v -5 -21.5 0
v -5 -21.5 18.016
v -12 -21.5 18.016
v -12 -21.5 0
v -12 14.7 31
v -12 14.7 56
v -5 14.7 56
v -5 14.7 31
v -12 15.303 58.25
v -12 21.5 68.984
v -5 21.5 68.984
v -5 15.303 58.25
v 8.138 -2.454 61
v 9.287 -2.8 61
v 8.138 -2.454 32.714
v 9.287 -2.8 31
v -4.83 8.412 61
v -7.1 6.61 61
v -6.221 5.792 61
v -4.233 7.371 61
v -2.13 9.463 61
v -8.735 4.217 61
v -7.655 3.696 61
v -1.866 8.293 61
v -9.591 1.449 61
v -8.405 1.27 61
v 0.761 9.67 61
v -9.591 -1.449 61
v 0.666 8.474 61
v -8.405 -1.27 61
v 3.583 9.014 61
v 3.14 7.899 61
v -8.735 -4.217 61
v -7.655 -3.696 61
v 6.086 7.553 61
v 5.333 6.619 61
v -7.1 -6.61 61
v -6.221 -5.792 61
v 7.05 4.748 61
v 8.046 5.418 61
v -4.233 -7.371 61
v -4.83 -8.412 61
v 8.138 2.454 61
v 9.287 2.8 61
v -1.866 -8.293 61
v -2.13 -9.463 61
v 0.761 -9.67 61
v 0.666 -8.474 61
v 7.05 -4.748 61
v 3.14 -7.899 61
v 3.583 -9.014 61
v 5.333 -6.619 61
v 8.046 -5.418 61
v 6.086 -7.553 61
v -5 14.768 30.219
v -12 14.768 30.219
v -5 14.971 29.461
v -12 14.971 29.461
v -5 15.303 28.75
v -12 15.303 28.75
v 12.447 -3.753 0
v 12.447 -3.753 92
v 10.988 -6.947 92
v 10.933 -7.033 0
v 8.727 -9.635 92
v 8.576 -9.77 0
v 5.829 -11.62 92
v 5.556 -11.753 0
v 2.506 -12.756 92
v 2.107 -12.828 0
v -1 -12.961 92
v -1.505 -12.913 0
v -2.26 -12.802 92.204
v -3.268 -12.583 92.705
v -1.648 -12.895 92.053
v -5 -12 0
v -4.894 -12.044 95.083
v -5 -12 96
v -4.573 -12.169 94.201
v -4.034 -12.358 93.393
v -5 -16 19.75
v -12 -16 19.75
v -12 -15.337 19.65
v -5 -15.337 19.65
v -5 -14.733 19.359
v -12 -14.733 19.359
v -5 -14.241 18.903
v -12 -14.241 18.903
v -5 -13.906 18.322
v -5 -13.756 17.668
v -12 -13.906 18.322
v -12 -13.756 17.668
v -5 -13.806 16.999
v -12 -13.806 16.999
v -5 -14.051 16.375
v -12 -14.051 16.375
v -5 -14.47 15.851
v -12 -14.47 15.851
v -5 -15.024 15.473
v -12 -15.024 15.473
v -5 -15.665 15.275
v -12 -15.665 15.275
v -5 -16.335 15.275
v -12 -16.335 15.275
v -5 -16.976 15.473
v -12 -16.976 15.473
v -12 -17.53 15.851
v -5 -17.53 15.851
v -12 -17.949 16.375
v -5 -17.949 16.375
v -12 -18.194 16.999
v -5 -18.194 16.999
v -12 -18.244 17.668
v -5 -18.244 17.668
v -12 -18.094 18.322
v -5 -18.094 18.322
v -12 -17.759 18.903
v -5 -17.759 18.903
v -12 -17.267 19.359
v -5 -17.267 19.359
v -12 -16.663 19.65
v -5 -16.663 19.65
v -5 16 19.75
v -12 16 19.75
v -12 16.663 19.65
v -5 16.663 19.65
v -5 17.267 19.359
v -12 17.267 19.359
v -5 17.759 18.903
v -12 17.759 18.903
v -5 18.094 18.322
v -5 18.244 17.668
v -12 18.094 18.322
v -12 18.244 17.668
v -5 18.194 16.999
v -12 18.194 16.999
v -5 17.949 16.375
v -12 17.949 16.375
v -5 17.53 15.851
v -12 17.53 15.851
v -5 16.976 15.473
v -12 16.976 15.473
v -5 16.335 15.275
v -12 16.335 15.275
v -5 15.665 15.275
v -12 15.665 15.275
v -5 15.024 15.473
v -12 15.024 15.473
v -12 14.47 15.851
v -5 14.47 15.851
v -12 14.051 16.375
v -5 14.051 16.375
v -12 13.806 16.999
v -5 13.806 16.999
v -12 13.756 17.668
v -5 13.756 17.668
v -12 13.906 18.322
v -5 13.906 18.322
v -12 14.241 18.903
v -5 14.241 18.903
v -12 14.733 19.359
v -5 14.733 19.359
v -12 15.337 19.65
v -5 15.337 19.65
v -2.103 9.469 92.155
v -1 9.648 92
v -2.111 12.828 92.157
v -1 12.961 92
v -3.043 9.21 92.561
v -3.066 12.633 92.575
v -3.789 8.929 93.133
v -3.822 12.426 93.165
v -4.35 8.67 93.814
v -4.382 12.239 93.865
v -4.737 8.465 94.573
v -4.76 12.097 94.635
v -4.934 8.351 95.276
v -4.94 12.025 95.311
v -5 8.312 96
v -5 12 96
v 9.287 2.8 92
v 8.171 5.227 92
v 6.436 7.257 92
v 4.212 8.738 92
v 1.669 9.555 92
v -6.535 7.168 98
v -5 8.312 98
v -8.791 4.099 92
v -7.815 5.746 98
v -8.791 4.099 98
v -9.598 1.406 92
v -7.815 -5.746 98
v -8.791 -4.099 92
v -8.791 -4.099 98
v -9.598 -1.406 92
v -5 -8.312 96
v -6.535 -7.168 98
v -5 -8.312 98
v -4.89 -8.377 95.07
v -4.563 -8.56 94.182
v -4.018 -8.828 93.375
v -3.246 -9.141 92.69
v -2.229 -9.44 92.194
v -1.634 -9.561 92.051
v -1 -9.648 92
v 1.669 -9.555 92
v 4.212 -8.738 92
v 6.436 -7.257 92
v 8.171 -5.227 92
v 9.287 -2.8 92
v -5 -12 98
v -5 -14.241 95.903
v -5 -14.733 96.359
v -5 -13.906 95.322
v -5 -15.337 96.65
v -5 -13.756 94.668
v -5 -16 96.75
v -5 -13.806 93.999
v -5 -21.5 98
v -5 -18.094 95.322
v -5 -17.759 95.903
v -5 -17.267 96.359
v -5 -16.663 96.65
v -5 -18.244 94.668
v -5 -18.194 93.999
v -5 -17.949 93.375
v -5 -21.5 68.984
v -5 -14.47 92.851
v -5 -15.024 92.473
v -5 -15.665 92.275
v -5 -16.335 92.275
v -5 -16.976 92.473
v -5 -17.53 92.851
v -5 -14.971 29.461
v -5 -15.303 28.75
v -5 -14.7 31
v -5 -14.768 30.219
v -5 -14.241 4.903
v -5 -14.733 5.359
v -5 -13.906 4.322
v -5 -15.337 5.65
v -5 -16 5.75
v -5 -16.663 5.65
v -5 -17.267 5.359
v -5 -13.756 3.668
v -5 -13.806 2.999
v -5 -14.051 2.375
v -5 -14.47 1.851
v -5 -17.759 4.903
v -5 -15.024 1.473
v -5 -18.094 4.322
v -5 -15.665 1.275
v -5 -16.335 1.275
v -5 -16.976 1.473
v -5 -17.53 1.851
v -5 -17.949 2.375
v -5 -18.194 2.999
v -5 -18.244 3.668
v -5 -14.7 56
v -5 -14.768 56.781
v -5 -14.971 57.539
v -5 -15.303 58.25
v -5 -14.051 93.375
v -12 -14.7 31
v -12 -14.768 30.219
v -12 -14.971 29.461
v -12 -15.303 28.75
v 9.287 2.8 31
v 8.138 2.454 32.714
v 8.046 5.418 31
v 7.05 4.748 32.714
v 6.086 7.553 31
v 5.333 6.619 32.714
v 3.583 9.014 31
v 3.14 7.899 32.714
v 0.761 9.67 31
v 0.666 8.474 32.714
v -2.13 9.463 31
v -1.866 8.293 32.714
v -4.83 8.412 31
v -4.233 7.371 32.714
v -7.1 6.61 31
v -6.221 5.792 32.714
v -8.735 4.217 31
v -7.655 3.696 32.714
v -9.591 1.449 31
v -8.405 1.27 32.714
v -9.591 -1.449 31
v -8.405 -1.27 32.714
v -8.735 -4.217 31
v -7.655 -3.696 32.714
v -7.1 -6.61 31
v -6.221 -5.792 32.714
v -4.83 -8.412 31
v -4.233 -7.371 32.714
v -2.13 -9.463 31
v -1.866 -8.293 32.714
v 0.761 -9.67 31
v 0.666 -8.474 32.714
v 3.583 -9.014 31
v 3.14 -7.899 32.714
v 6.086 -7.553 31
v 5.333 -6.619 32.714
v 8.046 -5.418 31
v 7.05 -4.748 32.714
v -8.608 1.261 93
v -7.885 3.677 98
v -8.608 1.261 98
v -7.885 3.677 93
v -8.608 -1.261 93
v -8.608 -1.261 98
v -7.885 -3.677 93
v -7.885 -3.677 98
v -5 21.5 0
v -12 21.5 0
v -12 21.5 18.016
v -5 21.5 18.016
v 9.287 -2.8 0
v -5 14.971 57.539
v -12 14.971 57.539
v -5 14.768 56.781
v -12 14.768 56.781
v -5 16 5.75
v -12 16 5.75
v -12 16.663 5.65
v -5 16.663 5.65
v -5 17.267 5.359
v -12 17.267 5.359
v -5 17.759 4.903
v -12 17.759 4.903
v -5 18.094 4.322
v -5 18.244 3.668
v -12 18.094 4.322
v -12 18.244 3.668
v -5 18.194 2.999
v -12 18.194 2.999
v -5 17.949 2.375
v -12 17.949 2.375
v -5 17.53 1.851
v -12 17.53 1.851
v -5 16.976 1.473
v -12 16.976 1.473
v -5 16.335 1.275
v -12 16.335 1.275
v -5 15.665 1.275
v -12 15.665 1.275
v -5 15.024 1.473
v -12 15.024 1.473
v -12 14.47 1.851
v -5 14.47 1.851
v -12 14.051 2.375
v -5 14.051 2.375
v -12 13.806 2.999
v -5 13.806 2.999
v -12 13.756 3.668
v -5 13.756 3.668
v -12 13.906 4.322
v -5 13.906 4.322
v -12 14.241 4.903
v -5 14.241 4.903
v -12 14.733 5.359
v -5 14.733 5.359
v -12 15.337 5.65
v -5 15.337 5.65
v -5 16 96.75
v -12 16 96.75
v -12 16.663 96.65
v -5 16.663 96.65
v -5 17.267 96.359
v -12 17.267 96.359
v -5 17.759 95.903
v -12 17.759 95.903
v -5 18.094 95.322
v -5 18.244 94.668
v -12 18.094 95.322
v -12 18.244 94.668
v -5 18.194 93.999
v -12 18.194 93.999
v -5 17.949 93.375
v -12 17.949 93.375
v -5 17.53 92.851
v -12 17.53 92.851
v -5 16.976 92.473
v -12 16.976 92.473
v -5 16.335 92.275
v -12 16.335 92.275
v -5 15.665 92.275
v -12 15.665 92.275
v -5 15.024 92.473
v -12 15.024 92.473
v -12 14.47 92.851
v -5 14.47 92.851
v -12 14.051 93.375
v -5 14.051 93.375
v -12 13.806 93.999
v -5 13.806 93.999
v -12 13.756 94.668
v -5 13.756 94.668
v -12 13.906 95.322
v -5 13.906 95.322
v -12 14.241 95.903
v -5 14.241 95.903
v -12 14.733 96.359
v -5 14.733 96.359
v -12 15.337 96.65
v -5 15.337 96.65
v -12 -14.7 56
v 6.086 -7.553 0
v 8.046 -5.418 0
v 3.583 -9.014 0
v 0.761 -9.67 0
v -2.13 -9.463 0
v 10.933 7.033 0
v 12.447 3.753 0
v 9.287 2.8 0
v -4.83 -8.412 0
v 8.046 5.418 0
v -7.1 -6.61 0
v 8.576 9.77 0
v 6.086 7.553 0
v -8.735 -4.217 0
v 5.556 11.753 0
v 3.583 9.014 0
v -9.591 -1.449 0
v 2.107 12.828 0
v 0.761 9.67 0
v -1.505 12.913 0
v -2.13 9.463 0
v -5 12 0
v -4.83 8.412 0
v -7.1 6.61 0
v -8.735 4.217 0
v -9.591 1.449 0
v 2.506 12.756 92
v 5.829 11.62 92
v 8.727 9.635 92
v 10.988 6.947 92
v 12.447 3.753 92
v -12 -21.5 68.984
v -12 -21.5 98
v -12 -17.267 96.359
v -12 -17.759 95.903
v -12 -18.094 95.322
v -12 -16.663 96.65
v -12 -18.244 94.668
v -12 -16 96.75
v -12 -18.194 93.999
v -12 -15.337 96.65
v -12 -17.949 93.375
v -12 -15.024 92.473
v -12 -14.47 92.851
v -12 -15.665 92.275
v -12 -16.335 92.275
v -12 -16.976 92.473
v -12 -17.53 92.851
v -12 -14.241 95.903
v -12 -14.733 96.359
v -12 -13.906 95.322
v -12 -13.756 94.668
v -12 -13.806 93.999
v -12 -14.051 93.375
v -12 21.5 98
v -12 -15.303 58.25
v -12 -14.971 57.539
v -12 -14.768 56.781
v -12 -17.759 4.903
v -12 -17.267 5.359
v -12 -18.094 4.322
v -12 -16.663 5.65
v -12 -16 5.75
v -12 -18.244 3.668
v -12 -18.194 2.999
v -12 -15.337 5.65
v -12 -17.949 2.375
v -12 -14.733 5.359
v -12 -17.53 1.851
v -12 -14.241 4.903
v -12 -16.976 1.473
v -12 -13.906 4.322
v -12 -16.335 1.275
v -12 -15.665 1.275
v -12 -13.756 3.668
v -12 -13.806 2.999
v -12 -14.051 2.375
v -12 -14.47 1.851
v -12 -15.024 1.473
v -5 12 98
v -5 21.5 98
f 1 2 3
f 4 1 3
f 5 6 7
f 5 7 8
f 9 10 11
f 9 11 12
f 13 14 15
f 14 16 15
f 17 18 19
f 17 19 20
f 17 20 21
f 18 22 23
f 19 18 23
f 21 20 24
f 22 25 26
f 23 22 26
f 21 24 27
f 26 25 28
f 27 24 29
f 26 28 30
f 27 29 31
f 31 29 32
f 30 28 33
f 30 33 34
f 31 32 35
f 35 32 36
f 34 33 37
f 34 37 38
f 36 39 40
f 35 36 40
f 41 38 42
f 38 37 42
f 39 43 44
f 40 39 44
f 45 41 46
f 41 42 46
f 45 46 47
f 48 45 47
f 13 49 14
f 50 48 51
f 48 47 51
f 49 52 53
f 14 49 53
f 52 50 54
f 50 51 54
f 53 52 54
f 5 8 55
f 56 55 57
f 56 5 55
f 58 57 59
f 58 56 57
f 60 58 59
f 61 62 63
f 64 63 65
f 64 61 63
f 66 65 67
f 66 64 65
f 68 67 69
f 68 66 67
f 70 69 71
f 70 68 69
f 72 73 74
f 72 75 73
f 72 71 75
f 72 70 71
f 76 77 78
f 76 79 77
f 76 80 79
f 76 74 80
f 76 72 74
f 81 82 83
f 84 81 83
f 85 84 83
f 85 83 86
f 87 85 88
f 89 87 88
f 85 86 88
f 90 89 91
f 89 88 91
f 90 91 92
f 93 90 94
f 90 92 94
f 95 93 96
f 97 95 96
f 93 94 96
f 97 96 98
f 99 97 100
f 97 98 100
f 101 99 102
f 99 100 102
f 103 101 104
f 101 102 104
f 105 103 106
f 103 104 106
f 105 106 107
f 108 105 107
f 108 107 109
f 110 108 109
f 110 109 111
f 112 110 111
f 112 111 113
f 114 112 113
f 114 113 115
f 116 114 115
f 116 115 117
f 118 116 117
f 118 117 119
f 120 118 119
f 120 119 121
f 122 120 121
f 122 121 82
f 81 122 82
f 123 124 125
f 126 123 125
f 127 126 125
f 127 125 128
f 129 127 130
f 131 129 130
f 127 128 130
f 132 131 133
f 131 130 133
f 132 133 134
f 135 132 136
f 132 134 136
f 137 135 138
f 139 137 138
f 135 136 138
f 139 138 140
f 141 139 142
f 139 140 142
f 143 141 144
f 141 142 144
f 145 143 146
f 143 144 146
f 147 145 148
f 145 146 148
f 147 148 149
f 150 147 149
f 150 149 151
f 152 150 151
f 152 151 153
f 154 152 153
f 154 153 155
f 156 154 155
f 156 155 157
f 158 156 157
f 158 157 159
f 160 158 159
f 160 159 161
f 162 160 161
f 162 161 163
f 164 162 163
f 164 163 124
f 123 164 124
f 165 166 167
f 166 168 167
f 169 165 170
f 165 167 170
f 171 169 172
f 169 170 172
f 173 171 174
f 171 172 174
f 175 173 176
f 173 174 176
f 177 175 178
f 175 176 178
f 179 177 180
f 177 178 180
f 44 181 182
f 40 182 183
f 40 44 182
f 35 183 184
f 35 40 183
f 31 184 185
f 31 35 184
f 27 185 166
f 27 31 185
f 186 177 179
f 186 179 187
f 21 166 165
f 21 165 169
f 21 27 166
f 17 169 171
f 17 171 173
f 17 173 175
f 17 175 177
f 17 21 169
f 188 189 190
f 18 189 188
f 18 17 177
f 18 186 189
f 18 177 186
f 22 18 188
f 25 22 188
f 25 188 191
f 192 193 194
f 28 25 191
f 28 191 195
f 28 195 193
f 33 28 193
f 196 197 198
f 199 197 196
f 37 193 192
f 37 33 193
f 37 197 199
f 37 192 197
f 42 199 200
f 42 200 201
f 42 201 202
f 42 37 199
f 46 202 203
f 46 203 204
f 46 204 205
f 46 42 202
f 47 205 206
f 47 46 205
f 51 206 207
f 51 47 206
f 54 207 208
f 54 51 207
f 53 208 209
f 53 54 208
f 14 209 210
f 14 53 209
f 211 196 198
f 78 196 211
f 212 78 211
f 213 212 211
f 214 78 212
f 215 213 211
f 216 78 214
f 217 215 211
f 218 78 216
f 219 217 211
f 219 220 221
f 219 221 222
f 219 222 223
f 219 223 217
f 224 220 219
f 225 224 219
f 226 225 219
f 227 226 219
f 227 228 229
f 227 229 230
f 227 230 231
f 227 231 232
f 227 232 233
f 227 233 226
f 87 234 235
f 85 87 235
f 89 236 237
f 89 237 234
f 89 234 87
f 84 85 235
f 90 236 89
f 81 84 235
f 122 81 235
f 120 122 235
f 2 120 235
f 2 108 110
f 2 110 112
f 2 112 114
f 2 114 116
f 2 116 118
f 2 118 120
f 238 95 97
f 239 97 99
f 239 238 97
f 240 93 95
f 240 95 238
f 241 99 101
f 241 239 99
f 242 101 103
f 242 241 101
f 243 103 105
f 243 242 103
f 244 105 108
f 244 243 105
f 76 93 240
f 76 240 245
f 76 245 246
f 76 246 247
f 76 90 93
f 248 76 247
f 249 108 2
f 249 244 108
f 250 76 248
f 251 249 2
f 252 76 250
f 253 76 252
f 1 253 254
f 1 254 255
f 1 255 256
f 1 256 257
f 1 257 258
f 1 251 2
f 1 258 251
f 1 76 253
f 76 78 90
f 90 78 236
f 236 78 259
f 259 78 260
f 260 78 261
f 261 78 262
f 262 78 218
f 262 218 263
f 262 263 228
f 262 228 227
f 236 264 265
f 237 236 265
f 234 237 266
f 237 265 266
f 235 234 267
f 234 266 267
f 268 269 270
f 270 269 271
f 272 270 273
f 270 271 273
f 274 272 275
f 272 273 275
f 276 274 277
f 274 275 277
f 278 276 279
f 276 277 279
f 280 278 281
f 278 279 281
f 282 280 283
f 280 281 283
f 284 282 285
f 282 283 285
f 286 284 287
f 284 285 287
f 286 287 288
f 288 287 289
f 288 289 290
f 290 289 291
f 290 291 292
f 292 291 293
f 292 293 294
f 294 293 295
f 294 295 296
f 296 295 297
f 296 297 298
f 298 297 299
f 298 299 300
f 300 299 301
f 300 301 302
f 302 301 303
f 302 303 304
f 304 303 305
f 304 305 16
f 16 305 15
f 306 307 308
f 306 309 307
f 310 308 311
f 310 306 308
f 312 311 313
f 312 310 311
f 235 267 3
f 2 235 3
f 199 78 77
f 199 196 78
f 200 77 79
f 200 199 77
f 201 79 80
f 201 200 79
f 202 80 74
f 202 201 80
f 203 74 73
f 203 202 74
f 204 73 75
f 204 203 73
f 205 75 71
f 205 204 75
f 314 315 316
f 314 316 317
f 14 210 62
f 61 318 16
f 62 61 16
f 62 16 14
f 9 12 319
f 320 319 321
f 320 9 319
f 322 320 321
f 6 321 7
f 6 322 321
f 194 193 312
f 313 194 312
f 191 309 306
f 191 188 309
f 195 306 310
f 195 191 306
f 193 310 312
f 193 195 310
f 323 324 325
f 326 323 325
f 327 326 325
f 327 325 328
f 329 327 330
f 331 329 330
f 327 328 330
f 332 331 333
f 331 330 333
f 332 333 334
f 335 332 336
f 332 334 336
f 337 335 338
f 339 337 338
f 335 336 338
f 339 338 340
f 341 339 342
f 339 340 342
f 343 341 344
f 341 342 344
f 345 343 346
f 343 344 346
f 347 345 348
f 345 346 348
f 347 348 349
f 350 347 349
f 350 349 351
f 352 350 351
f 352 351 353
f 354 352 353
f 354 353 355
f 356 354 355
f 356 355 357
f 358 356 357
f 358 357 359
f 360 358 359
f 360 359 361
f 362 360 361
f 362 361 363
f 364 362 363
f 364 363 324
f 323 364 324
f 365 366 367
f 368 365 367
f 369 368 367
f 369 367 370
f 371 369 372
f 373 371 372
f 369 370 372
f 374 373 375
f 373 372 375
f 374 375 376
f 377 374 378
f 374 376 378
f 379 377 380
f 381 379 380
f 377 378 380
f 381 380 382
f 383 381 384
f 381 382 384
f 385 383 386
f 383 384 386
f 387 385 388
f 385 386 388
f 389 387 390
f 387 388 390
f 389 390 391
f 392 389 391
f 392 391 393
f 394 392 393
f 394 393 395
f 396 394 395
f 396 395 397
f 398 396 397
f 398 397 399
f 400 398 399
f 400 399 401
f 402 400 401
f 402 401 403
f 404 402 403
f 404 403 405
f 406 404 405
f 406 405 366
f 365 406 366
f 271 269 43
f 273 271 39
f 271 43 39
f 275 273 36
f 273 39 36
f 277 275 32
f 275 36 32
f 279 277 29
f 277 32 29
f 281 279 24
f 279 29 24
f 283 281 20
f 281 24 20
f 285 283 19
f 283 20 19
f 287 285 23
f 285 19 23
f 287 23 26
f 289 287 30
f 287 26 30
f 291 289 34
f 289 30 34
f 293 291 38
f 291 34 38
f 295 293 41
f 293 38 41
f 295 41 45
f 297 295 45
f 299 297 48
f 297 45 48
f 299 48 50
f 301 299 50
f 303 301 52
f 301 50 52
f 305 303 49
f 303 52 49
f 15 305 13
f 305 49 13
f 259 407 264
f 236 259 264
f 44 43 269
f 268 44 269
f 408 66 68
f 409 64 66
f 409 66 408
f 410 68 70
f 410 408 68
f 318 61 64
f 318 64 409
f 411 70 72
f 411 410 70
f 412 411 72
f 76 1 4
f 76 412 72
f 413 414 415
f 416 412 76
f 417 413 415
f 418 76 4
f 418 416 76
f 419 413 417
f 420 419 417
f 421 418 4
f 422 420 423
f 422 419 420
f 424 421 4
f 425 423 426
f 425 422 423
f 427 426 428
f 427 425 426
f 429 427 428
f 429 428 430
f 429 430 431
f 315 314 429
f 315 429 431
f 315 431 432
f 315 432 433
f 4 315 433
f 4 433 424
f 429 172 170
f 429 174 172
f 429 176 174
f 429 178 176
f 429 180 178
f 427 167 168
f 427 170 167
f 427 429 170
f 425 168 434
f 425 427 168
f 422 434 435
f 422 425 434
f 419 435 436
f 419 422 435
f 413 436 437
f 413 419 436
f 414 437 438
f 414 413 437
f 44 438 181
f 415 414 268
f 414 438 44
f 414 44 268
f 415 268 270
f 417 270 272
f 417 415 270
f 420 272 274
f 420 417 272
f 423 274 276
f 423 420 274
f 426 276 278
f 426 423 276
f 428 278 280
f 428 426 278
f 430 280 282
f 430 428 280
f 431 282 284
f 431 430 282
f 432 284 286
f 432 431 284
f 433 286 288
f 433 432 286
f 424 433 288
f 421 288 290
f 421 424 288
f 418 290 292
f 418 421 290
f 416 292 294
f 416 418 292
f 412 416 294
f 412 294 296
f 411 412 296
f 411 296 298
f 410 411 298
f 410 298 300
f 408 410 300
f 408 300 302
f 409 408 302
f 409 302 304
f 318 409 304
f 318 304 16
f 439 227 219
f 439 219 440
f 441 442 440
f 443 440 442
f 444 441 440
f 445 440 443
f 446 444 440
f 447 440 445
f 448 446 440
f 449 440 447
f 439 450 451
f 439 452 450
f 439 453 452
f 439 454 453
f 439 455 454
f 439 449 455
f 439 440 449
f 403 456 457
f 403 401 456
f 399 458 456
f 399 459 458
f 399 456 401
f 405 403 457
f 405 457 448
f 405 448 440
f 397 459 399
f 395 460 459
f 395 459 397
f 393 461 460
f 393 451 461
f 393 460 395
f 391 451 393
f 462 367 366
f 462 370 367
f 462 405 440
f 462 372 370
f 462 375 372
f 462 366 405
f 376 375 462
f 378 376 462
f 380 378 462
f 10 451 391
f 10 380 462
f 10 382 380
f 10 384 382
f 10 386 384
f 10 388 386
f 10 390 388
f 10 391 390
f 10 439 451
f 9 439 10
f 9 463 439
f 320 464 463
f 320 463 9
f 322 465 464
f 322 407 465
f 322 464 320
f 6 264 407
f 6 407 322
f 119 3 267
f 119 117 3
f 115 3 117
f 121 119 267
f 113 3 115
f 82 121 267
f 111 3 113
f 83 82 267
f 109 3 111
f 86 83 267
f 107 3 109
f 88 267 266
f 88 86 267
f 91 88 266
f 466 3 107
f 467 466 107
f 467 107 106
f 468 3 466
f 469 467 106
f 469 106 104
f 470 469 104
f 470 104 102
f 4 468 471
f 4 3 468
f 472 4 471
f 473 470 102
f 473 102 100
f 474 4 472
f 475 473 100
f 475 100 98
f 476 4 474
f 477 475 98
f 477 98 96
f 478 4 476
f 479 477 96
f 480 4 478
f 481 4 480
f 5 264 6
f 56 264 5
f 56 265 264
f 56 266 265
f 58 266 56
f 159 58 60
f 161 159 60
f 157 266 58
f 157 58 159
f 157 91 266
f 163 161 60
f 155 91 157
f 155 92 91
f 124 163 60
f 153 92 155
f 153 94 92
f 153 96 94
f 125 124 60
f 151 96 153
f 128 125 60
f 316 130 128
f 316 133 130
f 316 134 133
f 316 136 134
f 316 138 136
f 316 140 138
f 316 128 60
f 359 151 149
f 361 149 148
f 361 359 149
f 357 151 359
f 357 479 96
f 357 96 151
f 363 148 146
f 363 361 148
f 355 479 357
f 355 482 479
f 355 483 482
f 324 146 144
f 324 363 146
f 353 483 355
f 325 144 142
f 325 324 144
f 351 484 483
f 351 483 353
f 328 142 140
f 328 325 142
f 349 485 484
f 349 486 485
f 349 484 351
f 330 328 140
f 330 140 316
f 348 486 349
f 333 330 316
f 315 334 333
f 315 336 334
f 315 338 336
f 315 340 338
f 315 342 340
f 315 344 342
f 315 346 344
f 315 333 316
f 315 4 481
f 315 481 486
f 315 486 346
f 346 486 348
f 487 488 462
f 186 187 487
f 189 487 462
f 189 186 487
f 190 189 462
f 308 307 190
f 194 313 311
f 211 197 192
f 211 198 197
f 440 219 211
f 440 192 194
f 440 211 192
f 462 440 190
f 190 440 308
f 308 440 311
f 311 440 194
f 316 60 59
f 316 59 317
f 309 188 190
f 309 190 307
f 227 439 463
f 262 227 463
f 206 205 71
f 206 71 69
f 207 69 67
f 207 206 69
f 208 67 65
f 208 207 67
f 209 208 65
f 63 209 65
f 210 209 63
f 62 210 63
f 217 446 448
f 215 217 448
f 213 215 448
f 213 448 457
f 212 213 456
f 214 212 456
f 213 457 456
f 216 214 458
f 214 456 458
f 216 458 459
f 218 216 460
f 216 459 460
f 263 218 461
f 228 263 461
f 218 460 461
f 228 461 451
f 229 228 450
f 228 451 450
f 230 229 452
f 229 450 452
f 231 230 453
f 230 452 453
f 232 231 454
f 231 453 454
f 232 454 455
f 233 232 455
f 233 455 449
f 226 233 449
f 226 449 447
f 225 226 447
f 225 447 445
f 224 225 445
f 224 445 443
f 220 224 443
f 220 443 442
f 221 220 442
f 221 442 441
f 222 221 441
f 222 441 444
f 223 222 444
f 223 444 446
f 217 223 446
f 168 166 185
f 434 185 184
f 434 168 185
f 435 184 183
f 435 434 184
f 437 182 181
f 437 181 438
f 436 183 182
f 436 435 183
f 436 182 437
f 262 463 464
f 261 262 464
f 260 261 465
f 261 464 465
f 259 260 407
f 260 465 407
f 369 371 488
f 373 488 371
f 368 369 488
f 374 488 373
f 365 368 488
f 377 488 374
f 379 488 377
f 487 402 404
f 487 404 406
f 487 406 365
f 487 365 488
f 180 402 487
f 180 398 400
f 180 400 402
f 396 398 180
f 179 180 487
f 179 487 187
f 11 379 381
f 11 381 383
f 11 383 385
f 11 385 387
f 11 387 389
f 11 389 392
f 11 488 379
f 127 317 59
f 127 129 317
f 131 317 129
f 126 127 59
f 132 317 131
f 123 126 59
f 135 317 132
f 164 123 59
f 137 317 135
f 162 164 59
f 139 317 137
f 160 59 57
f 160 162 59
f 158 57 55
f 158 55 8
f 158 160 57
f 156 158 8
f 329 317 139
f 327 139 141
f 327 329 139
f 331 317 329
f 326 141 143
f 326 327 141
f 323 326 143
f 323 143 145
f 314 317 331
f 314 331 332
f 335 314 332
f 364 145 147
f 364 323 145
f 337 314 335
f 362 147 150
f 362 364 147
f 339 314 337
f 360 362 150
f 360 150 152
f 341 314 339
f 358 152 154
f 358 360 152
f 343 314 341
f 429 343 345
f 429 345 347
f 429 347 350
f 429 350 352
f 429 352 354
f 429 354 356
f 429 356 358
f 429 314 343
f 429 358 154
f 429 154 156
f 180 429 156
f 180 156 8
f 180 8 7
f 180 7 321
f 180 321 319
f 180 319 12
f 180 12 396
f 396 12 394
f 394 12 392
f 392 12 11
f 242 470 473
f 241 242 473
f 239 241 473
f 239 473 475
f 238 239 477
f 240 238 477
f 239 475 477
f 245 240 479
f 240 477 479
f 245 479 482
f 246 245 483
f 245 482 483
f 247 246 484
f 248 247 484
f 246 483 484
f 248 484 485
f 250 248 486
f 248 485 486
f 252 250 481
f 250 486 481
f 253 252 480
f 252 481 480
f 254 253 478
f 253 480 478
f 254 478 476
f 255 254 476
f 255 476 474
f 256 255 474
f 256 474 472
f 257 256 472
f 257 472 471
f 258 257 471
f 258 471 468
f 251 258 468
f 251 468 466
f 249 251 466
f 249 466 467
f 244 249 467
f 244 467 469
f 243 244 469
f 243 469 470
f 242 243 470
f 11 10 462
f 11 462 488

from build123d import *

# Parameters (mm, degrees)
BOSS_EXTRUDE1_DEPTH      = 98
SKETCH2_R                = 2.25
CUT_EXTRUDE1_DEPTH       = 25.44661253
SKETCH4_W                = 19.691623847
SKETCH4_H                = 43
CUT_EXTRUDE2_DEPTH       = 6
FILLET1_R                = 4
CUT_EXTRUDE3_DEPTH       = 62.0000001
CUT_EXTRUDE4_DEPTH       = 25.44661263
REVOLVE2_ANGLE           = 25
REVOLVE2_OTHER_WAY_ANGLE = 25


with BuildPart() as part:
    # Sketch1 → Boss-Extrude1 (new body)
    with BuildSketch(Plane.XY):
        with BuildLine():
            Line((-5, -12), (-5, -21.5))
            Line((-5, -21.5), (-12, -21.5))
            Line((-12, -21.5), (-12, 21.5))
            Line((-12, 21.5), (-5, 21.5))
            Line((-5, 21.5), (-5, 12))
            ThreePointArc((-5, 12), (5.555898195, 11.752956872), (12.44661253, 3.75257732))
            Line((12.44661253, 3.75257732), (9.287087811, 2.8))
            ThreePointArc((9.287087811, 2.8), (-9.7, 0), (9.287087811, -2.8))
            Line((9.287087811, -2.8), (12.44661253, -3.75257732))
            ThreePointArc((12.44661253, -3.75257732), (5.555898195, -11.752956872), (-5, -12))
        make_face()
    extrude(amount=BOSS_EXTRUDE1_DEPTH)

    # Sketch2 → Cut-Extrude1 (cut, through all)
    with BuildSketch(Plane.ZY.offset(12)):
        with Locations((3.5, 16)):
            Circle(SKETCH2_R)
        with Locations((94.5, -16)):
            Circle(SKETCH2_R)
        with Locations((94.5, 16)):
            Circle(SKETCH2_R)
        with Locations((3.5, -16)):
            Circle(SKETCH2_R)
        with Locations((17.5, 16)):
            Circle(SKETCH2_R)
        with Locations((17.5, -16)):
            Circle(SKETCH2_R)
    extrude(amount=-CUT_EXTRUDE1_DEPTH, mode=Mode.SUBTRACT)

    # Sketch3 → Revolve1 (revolve)
    with BuildSketch(Plane.ZY, mode=Mode.PRIVATE) as revolve1_sk:
        Polygon((31, 9.7), (32.713777608, 8.5), (61, 8.5), (61, 9.7), align=None)
    revolve(revolve1_sk.sketch.rotate(Axis((0, 0, 0), (0, 0, 1)), 90), axis=Axis((0, 0, 0), (0, 0, 1)))  # turned: the seam where the file's is

    # Sketch4 → Cut-Extrude2 (cut)
    with BuildSketch(Plane.XY.offset(98)):
        with Locations((4.845811924, 0)):
            Rectangle(SKETCH4_W, SKETCH4_H)
    extrude(amount=-CUT_EXTRUDE2_DEPTH, mode=Mode.SUBTRACT)

    # Fillet1
    fillet1_edges = [part.edges().sort_by_distance(p)[0] for p in [
        (-5, 10.15601973, 92),
        (-5, -10.15601973, 92),
    ]]
    fillet(fillet1_edges, radius=FILLET1_R)

    # Sketch5 → Cut-Extrude3 (cut, through all)
    with BuildSketch(Plane.XY.offset(61)):
        with BuildLine():
            Line((8.138169731, 2.453608247), (9.287087811, 2.8))
            ThreePointArc((9.287087811, 2.8), (9.7, 0), (9.287087811, -2.8))
            Line((9.287087811, -2.8), (8.138169731, -2.453608247))
            ThreePointArc((8.138169731, -2.453608247), (8.5, 0), (8.138169731, 2.453608247))
        make_face()
    extrude(amount=-CUT_EXTRUDE3_DEPTH, mode=Mode.SUBTRACT)

    # Sketch6 → Cut-Extrude4 (cut, through all)
    with BuildSketch(Plane.ZY.offset(12)):
        with BuildLine():
            Line((28.75, 15.302885683), (18.016283143, 21.5))
            Line((18.016283143, 21.5), (68.983716857, 21.5))
            Line((68.983716857, 21.5), (58.25, 15.302885683))
            ThreePointArc((58.25, 15.302885683), (57.164685703, 14.853333782), (56, 14.7))
            Line((56, 14.7), (31, 14.7))
            ThreePointArc((31, 14.7), (29.835314297, 14.853333782), (28.75, 15.302885683))
        make_face()
    cut_extrude4 = extrude(amount=-CUT_EXTRUDE4_DEPTH, mode=Mode.SUBTRACT)

    # Mirror1: Cut-Extrude4 across plane
    add(cut_extrude4.mirror(Plane.ZX), mode=Mode.SUBTRACT)

    # Sketch7 → Revolve2 (revolve)
    with BuildSketch(Plane(origin=(0, 0, 0), x_dir=(1, 0, 0), z_dir=(0, 1, 0))):
        Polygon((-9.7, -92), (-9.7, -98), (-8.7, -98), (-8.7, -93), align=None)
    revolve(axis=Axis((0, 0, 97.129634248), (0, 0, -1)), revolution_arc=REVOLVE2_ANGLE)

    # Sketch7 → Revolve2 other way (revolve)
    with BuildSketch(Plane(origin=(0, 0, 0), x_dir=(1, 0, 0), z_dir=(0, 1, 0))):
        Polygon((-9.7, -92), (-9.7, -98), (-8.7, -98), (-8.7, -93), align=None)
    revolve(axis=Axis((0, 0, 97.129634248), (0, 0, 1)), revolution_arc=REVOLVE2_OTHER_WAY_ANGLE)


solid = part.part
